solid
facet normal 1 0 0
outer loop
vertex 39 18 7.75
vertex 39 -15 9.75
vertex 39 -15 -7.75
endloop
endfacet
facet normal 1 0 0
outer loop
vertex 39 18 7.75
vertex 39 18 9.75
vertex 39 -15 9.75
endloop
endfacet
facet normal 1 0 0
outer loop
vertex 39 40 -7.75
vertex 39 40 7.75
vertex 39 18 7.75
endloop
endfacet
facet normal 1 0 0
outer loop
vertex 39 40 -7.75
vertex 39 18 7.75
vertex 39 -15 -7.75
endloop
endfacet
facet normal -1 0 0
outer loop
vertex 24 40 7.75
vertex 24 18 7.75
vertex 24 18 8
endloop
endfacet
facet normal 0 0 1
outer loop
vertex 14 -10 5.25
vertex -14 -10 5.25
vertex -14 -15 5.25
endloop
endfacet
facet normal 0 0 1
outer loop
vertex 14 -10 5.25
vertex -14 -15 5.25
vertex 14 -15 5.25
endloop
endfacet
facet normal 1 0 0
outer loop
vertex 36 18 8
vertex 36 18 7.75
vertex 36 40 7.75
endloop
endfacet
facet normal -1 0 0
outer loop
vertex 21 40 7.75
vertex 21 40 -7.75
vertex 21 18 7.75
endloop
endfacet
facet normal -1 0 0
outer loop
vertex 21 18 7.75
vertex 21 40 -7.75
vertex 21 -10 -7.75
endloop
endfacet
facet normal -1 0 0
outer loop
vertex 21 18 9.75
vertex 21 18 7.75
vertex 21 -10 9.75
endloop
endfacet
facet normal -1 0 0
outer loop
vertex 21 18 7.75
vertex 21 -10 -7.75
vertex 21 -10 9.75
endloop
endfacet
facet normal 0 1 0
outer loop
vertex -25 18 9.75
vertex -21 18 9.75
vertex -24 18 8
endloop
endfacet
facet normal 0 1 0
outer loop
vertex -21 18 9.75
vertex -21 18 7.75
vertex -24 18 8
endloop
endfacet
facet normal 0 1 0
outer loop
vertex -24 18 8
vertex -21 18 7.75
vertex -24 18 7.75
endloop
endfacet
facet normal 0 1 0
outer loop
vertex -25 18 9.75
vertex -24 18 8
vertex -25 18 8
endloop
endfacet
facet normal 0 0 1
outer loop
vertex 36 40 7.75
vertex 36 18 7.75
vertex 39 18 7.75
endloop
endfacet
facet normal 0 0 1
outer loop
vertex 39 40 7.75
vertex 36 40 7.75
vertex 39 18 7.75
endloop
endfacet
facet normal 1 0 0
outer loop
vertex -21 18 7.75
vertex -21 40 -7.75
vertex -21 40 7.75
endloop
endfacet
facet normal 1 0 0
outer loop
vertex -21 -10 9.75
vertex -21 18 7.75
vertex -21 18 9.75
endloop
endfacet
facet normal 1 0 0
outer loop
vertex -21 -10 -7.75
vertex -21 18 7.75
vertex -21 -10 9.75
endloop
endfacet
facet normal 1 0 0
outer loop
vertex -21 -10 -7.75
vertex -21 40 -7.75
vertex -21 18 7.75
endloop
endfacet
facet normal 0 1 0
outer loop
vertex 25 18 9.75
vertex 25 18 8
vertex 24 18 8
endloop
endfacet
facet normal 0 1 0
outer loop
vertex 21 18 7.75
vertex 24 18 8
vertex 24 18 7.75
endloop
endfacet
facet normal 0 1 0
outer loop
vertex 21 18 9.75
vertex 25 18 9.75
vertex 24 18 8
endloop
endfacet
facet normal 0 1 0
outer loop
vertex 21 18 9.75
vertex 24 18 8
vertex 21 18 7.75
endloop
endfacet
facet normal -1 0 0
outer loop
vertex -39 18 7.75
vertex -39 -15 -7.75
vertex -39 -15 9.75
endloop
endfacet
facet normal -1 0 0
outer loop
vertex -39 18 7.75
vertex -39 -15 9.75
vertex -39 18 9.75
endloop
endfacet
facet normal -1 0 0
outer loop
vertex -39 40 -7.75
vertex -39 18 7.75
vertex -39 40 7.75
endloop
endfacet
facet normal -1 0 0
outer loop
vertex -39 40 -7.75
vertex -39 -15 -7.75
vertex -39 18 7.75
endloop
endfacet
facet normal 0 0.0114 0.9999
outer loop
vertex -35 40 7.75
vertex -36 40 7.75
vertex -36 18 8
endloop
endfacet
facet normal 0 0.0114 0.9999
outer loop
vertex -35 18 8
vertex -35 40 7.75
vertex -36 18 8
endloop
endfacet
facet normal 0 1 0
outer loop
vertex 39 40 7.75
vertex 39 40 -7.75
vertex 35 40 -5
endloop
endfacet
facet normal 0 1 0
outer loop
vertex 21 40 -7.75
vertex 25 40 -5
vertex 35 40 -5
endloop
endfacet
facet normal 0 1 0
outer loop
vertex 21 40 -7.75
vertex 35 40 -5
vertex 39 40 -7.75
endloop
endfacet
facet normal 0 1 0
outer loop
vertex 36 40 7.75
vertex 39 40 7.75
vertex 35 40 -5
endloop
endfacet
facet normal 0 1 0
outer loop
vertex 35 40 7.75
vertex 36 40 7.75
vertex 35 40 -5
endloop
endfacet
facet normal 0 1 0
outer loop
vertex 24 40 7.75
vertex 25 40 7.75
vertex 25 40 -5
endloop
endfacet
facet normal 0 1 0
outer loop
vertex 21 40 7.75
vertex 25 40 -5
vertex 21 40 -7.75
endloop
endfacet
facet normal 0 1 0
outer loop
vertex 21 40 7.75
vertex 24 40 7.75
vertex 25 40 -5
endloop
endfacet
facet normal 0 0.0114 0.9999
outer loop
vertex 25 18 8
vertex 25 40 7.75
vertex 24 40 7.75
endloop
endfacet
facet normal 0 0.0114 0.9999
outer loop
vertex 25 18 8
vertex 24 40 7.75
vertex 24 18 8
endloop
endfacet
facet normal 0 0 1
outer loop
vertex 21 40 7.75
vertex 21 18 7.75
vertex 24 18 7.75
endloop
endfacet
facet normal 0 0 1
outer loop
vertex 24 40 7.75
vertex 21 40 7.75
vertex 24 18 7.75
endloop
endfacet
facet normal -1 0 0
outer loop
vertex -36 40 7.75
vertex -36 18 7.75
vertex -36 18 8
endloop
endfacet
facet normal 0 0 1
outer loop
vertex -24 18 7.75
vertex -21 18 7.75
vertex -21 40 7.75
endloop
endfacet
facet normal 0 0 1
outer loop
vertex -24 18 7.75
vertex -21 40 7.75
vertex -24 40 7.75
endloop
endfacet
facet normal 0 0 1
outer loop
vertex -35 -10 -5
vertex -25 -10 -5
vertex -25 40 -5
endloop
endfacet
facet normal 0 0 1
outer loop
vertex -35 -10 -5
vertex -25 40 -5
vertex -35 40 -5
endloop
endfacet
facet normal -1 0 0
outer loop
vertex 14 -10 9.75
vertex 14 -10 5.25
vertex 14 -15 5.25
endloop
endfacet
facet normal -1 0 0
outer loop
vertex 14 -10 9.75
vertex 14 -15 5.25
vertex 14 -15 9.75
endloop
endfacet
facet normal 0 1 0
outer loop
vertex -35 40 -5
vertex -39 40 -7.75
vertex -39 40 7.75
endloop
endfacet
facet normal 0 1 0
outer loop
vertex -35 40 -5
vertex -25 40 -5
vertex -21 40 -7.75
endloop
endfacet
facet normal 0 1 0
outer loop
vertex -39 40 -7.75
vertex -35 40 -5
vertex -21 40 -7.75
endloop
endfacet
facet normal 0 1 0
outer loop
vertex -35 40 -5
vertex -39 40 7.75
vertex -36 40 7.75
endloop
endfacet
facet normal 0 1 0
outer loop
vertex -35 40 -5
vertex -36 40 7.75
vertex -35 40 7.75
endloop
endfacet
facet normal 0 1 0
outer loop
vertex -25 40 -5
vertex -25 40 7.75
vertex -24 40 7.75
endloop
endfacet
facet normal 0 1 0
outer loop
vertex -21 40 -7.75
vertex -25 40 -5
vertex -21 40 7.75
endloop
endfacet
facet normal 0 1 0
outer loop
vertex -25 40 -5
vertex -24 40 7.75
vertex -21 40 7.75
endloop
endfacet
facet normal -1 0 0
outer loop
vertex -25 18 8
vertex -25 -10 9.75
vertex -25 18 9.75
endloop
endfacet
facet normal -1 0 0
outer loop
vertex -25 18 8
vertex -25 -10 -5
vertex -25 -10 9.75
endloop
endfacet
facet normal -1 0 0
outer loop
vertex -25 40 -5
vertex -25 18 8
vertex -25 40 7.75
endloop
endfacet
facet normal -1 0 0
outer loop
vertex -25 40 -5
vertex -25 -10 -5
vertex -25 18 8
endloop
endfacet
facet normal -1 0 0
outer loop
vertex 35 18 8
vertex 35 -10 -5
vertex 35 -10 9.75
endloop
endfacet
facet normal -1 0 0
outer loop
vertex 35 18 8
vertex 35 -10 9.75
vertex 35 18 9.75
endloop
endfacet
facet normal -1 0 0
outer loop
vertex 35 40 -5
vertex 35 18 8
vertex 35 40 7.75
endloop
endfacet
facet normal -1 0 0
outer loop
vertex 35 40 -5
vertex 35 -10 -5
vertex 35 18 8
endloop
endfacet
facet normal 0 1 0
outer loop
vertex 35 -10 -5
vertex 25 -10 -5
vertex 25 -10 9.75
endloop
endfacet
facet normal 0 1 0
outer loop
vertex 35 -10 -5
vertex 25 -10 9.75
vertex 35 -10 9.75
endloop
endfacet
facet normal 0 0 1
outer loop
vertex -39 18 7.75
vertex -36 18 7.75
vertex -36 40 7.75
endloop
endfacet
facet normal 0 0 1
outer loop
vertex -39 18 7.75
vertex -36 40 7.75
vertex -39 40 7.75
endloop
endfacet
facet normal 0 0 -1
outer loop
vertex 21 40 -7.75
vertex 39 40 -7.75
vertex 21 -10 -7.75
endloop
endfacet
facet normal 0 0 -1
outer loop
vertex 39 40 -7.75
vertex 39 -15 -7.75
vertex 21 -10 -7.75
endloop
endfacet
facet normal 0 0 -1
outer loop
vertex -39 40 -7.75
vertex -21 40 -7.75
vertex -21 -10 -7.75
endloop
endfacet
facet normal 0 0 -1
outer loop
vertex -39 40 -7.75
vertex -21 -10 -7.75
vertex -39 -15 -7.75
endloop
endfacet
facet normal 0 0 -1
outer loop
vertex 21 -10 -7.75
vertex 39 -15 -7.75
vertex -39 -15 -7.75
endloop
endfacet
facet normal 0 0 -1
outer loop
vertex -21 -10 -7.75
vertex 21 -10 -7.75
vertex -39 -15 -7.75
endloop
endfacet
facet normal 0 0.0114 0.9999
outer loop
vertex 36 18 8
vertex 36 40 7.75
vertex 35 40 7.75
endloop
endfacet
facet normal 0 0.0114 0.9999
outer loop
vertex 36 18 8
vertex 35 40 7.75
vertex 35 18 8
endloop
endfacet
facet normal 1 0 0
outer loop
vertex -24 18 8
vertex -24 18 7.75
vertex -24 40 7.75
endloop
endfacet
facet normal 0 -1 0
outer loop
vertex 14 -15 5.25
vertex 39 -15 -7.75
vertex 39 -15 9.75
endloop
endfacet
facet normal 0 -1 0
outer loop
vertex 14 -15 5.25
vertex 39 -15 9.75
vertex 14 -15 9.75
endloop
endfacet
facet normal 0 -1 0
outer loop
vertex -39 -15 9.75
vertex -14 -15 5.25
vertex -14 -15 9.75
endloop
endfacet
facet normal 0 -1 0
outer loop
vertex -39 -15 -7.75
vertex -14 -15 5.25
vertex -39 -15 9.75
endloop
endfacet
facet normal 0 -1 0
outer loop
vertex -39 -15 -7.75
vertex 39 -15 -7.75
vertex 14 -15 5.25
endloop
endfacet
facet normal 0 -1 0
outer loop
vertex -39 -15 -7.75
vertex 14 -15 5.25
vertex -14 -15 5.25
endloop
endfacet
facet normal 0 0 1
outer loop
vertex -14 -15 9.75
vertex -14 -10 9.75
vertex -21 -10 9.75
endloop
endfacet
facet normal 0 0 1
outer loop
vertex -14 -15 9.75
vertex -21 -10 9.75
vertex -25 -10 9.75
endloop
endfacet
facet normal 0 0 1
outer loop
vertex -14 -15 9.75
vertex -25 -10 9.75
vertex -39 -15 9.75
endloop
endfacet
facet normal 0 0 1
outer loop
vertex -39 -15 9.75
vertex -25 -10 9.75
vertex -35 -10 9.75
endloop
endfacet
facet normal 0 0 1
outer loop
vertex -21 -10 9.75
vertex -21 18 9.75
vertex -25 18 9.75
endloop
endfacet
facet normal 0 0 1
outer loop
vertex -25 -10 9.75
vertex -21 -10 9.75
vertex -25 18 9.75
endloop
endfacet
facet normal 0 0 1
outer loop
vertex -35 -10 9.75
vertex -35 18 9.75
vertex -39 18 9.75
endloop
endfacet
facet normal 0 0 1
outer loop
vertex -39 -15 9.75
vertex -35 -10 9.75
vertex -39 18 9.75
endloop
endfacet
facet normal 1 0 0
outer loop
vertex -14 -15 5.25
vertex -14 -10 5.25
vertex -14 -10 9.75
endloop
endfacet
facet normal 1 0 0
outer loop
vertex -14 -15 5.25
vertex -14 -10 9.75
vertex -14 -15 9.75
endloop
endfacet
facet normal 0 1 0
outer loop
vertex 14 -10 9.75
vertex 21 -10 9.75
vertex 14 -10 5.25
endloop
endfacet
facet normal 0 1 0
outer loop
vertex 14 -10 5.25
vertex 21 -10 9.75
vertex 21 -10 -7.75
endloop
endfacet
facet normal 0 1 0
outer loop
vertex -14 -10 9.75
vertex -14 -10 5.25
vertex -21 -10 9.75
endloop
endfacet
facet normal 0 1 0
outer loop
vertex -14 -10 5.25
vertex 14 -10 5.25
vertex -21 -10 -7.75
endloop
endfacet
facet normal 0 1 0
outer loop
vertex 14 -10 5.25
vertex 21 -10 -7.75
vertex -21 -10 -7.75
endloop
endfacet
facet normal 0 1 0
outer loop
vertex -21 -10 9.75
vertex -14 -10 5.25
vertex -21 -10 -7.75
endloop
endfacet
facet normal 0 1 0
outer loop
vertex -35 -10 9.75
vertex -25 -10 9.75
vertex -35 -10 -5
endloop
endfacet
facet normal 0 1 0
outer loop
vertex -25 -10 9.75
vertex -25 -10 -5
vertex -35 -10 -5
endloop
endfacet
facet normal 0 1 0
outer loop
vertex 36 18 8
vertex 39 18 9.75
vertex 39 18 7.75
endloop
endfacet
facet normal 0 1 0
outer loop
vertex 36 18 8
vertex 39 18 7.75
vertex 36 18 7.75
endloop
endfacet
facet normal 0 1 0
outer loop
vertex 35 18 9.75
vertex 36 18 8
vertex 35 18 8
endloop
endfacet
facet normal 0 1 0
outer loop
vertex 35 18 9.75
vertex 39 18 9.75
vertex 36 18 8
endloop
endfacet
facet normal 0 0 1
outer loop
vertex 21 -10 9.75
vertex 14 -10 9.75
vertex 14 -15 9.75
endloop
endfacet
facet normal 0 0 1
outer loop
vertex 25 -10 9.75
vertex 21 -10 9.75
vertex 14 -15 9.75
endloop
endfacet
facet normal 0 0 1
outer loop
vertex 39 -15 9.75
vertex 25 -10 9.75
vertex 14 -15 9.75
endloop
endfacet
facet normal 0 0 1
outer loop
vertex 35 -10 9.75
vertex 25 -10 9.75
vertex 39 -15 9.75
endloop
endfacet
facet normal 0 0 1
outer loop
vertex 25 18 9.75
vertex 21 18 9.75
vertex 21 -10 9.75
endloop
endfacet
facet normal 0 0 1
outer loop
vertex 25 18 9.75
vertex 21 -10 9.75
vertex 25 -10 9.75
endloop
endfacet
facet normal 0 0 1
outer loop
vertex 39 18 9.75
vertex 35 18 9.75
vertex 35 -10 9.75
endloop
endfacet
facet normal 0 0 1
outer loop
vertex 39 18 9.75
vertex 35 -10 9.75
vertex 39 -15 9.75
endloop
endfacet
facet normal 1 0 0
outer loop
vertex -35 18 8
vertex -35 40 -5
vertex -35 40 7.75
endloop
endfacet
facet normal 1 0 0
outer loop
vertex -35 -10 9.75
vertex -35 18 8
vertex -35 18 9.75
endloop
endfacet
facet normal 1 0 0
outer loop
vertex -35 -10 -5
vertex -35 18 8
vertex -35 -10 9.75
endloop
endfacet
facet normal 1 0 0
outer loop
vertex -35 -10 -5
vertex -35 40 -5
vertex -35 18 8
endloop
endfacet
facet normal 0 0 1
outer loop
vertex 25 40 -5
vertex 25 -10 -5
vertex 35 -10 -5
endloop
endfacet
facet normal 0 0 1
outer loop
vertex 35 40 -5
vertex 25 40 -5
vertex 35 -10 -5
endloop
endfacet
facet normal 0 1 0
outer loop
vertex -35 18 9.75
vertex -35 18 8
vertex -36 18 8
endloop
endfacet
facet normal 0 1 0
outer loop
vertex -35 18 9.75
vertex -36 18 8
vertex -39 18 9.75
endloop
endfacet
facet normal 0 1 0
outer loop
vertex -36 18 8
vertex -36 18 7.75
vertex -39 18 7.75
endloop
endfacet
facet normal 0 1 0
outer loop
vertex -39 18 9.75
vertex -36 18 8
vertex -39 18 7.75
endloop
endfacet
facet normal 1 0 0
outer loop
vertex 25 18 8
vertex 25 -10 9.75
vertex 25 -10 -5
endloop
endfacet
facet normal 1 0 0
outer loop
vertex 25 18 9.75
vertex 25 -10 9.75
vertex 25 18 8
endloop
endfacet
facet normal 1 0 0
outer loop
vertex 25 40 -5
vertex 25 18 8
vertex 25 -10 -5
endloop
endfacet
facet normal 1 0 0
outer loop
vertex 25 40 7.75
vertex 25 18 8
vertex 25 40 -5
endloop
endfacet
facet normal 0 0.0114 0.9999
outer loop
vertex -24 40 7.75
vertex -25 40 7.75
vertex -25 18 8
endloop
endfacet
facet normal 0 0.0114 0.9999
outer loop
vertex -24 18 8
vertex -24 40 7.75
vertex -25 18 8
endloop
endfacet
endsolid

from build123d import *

# Parameters (mm, degrees)
F1_DEPTH  = 40
F2_W      = 4
F2_H      = 0.5
F3_DEPTH  = 18
F5_W      = 1
F5_H      = 22
F6_DEPTH  = 0.5
F4_W      = 10
F4_H      = 6.25
F4_H_2    = 5.75
F7_DEPTH  = 15
F9_DEPTH  = 36.001
F10_DEPTH = 5.75
F11_DEPTH = 7
F12_DEPTH = 10
F14_DEPTH = 1.5


with BuildPart() as f1:
    # F0 (on Front) → F1 (new body)
    with BuildSketch(Plane.XZ):
        Polygon((-25, 2), (-35, 2), (-35, 7.75), (-39, 7.75), (-39, -7.75), (-35, -7.75), (-35, -2), (-25, -2), (-25, -7.75), (-21, -7.75), (-21, 7.75), (-25, 7.75), align=None)
    extrude(amount=-F1_DEPTH)

    # F2 (on face) → F3 (join)
    with BuildSketch(Plane.XZ):
        with Locations((-37, 8)):
            Rectangle(F2_W, F2_H)
        with Locations((-23, 8)):
            Rectangle(F2_W, F2_H)
    extrude(amount=-F3_DEPTH)

    # F5 (on face) → F6 (join)
    with BuildSketch(Plane.XY.offset(7.75)):
        with Locations((-35.5, 29)):
            Rectangle(F5_W, F5_H)
        with Locations((-24.5, 29)):
            Rectangle(F5_W, F5_H)
    extrude(amount=F6_DEPTH)

    # F4 (on face) → F7 (join)
    with BuildSketch(Plane.XZ):
        with Locations((-30, 5.125)):
            Rectangle(F4_W, F4_H)
        Polygon((-35, 8.25), (-39, 8.25), (-39, -7.75), (-35, -7.75), (-35, -2), (-25, -2), (-25, -7.75), (-21, -7.75), (-21, 8.25), (-25, 8.25), (-25, 2), (-35, 2), align=None)
        with Locations((-30, -4.875)):
            Rectangle(F4_W, F4_H_2)
        Polygon((-14, 8.25), (-21, 8.25), (-21, -7.75), (-13.5, -7.75), (0, -7.75), (0, 5.25), (-14, 5.25), align=None)
    extrude(amount=F7_DEPTH)

    # F8 (on face) → F9 (cut, through all)
    with BuildSketch(Plane(origin=(-36, 0, 0), x_dir=(0, -1, 0), z_dir=(-1, 0, 0))):
        Polygon((-40, 8.25), (-40, 7.75), (-18, 8), (-18, 8.25), align=None)
    extrude(amount=-F9_DEPTH, mode=Mode.SUBTRACT)

    # F10 (add, through all): a face of the model
    f10_faces = [f1.faces().sort_by_distance(p)[0] for p in [
        (-30, 20, -2),
    ]]
    extrude(f10_faces, amount=F10_DEPTH)

    # F11 (cut): a face of the model
    f11_faces = [f1.faces().sort_by_distance(p)[0] for p in [
        (-30, 20, 2),
    ]]
    extrude(f11_faces, amount=-F11_DEPTH, mode=Mode.SUBTRACT)

    # F12 (cut): faces of the model
    f12_faces = [f1.faces().sort_by_distance(p)[0] for p in [
        (-11, 0, -0.6785714286),
        (-30, 0, 1.625),
        (-11, 0, -0.6785714286),
    ]]
    extrude(f12_faces, amount=-F12_DEPTH, mode=Mode.SUBTRACT)

    # F13: F1 across plane


with BuildPart() as f1_1:
    add(f1.part)
    add(f1.part.mirror(Plane.YZ))

    # F14 (add): faces of the model
    f14_faces = [f1_1.faces().sort_by_distance(p)[0] for p in [
        (-21.4140048309, 4, 8.25),
        (21.4140048309, 4, 8.25),
    ]]
    extrude(f14_faces, amount=F14_DEPTH)


solid = f1_1.part
